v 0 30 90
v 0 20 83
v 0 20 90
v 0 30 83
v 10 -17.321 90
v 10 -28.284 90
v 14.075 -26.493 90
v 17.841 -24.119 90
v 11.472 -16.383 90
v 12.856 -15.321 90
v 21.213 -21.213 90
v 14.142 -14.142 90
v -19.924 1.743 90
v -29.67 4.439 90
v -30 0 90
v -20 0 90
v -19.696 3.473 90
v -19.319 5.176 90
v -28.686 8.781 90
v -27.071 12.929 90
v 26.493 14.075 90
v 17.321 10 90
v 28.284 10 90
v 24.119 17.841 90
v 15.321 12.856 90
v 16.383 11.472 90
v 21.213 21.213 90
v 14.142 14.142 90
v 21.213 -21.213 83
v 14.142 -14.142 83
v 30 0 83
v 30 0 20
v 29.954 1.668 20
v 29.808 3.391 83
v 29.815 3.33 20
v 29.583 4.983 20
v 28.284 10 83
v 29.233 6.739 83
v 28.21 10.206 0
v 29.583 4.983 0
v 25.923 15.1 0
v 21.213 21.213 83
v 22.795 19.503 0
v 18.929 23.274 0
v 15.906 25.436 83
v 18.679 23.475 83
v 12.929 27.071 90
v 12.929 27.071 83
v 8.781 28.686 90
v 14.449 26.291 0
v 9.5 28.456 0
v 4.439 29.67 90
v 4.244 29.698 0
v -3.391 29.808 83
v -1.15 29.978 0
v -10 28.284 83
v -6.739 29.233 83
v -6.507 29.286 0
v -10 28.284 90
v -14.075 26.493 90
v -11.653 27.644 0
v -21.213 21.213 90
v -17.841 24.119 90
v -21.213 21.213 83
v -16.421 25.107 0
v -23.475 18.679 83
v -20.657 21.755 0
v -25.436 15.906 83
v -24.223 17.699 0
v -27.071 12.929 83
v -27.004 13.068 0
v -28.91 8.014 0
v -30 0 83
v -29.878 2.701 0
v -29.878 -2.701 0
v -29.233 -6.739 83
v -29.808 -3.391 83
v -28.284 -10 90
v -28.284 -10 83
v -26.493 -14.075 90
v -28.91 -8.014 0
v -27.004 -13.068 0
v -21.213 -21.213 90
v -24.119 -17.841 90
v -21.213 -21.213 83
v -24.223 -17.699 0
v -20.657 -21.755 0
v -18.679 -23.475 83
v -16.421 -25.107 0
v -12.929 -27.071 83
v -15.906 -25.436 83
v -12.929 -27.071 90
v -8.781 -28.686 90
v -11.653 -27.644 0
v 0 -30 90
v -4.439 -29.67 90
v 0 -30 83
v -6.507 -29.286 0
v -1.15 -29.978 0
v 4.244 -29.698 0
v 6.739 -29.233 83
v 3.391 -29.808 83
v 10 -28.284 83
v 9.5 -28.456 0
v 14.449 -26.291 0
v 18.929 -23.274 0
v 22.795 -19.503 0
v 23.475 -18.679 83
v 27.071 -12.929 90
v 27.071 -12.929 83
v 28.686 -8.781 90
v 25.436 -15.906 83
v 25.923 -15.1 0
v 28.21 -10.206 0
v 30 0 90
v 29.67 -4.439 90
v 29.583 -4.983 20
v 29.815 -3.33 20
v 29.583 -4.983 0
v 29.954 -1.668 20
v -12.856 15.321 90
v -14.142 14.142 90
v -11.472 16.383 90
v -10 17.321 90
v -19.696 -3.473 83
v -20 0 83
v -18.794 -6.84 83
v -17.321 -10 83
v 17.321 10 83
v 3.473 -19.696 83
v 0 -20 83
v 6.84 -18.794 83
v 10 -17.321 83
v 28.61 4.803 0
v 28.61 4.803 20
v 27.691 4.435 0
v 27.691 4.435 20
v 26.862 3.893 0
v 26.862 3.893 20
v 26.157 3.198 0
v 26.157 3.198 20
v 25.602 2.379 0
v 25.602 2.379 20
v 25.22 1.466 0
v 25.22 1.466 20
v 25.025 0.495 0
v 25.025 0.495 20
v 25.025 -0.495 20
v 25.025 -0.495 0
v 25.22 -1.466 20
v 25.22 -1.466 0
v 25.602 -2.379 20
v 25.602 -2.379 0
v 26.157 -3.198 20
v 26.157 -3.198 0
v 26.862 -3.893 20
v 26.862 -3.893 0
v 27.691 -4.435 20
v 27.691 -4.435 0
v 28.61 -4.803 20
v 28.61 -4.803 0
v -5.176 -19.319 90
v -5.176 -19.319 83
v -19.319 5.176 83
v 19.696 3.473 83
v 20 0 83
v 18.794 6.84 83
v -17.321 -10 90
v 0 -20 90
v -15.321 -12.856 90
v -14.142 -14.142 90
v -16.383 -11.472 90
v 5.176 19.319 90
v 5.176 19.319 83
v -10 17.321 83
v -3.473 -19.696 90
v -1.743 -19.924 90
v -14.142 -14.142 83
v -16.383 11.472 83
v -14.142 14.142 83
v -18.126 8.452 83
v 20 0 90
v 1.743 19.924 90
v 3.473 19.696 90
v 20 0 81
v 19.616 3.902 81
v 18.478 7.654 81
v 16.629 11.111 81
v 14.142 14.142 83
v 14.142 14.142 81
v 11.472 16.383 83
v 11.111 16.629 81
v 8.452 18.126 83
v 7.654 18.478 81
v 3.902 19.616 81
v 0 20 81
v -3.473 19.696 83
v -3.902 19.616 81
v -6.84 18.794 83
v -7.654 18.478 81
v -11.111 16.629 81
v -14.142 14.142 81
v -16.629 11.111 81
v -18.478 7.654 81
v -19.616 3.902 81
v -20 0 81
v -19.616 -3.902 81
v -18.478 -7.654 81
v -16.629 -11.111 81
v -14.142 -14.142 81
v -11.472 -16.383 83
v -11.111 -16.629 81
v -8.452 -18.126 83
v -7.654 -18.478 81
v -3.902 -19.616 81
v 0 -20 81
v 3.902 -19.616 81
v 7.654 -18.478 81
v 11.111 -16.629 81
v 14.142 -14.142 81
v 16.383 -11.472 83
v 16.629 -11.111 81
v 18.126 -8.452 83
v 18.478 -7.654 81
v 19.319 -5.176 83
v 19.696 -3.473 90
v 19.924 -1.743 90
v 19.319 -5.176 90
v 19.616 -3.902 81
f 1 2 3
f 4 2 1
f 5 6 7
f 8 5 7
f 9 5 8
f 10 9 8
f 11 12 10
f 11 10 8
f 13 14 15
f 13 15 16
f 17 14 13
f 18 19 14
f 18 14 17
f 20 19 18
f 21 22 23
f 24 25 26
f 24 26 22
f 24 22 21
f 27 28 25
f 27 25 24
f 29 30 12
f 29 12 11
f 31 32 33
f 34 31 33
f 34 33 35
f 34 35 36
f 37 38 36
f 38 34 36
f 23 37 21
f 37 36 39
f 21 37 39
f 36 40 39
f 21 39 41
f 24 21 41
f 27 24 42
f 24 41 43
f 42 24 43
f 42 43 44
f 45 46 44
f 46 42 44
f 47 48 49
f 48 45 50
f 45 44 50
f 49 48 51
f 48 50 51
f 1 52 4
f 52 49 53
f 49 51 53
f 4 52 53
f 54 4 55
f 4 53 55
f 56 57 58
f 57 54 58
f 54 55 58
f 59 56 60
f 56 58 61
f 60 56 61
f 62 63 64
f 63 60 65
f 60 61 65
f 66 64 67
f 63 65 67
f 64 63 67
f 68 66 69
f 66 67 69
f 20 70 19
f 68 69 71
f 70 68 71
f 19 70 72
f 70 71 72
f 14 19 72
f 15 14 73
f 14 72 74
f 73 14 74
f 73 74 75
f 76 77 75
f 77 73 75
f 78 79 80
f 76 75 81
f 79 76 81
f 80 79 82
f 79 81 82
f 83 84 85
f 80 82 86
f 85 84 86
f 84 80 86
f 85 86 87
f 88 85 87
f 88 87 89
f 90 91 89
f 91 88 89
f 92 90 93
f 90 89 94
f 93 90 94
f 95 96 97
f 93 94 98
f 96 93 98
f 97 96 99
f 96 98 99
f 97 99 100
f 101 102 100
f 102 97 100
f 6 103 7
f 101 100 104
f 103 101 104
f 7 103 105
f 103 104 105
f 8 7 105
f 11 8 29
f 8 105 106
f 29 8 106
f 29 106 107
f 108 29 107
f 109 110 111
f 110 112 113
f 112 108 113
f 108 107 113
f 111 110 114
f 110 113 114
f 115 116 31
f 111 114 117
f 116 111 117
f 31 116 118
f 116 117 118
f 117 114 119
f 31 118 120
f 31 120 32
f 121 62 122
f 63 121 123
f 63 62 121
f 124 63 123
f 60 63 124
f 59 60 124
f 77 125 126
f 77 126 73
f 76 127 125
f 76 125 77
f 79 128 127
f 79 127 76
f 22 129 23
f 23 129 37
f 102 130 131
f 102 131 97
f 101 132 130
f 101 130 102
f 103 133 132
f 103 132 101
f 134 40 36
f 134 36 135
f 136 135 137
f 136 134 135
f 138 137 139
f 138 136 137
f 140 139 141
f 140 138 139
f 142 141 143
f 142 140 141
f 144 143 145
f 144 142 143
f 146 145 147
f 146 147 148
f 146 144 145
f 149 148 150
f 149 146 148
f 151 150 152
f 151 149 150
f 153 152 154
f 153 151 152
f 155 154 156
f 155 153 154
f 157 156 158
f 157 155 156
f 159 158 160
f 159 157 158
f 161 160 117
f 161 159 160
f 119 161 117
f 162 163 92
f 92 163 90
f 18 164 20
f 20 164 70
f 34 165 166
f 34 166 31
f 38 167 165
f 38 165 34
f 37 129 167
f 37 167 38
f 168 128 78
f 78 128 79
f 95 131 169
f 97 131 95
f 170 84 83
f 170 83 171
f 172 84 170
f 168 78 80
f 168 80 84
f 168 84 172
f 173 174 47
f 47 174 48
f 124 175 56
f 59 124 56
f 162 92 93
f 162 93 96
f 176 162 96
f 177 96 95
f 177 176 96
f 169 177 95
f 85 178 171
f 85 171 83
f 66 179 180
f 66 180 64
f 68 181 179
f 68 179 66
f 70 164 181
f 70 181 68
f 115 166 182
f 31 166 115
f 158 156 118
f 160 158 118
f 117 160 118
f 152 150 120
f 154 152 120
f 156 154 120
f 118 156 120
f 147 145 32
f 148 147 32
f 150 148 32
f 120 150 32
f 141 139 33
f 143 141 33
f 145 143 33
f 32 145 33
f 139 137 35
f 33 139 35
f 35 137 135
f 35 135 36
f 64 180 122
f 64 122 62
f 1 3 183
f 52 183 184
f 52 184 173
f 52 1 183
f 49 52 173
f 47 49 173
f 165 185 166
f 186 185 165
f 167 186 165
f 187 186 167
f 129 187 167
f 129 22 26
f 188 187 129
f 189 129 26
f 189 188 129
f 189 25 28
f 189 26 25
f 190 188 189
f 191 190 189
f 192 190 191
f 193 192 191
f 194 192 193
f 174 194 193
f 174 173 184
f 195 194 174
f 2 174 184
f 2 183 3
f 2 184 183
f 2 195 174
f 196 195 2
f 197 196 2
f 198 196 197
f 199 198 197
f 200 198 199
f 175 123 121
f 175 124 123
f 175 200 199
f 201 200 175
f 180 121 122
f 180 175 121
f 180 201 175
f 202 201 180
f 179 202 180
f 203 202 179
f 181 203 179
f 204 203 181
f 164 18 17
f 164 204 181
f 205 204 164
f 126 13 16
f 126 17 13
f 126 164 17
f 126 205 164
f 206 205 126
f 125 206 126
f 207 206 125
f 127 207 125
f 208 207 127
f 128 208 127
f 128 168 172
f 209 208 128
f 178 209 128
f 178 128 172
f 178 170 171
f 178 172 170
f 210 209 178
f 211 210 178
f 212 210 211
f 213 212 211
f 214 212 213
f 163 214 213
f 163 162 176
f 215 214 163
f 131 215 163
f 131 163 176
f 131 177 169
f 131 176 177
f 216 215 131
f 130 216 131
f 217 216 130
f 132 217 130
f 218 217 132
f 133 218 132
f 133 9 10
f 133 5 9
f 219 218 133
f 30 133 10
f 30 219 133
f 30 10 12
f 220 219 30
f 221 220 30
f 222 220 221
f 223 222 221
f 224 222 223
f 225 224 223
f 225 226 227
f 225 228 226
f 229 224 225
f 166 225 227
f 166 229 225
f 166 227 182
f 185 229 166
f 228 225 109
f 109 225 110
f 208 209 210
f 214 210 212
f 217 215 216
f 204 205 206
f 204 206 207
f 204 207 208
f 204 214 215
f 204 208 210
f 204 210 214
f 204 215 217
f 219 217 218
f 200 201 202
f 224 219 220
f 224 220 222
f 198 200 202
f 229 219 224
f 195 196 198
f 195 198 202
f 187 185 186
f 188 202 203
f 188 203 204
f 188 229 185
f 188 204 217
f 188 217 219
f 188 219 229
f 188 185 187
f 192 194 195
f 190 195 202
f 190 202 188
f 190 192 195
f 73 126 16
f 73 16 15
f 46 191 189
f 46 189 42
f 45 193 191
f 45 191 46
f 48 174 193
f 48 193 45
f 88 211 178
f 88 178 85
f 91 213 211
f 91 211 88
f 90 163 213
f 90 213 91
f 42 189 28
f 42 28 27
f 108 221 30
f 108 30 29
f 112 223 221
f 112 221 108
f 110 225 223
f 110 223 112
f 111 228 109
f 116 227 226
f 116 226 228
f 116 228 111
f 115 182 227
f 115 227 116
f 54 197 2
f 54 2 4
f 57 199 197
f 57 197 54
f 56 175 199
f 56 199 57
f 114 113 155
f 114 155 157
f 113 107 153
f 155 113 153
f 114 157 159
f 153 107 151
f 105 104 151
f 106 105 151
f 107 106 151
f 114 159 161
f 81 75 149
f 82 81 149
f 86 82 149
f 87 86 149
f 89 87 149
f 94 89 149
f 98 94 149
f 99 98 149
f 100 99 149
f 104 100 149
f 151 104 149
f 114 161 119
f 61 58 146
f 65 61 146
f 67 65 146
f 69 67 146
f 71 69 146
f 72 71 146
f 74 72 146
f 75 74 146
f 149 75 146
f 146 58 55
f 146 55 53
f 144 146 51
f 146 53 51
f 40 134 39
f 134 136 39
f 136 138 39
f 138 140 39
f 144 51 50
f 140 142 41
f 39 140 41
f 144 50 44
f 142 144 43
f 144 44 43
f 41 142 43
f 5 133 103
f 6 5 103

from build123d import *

# Parameters (mm, degrees)
CYLINDER002_R     = 5
CYLINDER002_DEPTH = 20
BOX_W             = 20
BOX_H             = 10
BOX_DEPTH         = 10
ARRAY_COUNT       = 8
CYLINDER001_R     = 20
CYLINDER001_DEPTH = 10
CYLINDER_R        = 30
CYLINDER_DEPTH    = 90


with BuildPart() as cilindro:
    # Cylinder002 → Cylinder002 (new body)
    with BuildSketch(Plane(origin=(30, 0, 0), x_dir=(1, 0, 0), z_dir=(0, 0, 1))):
        Circle(CYLINDER002_R)
    extrude(amount=CYLINDER002_DEPTH)


with BuildPart() as array:
    # Box → Box (new body)
    with BuildSketch(Plane(origin=(13, 0, 83), x_dir=(1, 0, 0), z_dir=(0, 0, 1))):
        with Locations((10, 5)):
            Rectangle(BOX_W, BOX_H)
    extrude(amount=BOX_DEPTH)

    # Array: Array ×8 about axis
    array_axis = Axis((0, 0, 0), (0, 0, 1))


with BuildPart() as array_1:
    add(array.part)
    for i in range(1, ARRAY_COUNT):
        add(array.part.rotate(array_axis, i * 360 / ARRAY_COUNT))


with BuildPart() as cylinder001:
    # Cylinder001 → Cylinder001 (new body)
    with BuildSketch(Plane.XY.offset(81)):
        Circle(CYLINDER001_R)
    extrude(amount=CYLINDER001_DEPTH)


with BuildPart() as cut002:
    # Cylinder → Cylinder (new body)
    with BuildSketch(Plane.XY):
        Circle(CYLINDER_R)
    extrude(amount=CYLINDER_DEPTH)

    # Cut: cut Cylinder001
    add(cylinder001.part, mode=Mode.SUBTRACT)

    # Cut001: cut Array
    add(array_1.part, mode=Mode.SUBTRACT)

    # Cut002: cut Cilindro
    add(cilindro.part, mode=Mode.SUBTRACT)


solid = cut002.part
